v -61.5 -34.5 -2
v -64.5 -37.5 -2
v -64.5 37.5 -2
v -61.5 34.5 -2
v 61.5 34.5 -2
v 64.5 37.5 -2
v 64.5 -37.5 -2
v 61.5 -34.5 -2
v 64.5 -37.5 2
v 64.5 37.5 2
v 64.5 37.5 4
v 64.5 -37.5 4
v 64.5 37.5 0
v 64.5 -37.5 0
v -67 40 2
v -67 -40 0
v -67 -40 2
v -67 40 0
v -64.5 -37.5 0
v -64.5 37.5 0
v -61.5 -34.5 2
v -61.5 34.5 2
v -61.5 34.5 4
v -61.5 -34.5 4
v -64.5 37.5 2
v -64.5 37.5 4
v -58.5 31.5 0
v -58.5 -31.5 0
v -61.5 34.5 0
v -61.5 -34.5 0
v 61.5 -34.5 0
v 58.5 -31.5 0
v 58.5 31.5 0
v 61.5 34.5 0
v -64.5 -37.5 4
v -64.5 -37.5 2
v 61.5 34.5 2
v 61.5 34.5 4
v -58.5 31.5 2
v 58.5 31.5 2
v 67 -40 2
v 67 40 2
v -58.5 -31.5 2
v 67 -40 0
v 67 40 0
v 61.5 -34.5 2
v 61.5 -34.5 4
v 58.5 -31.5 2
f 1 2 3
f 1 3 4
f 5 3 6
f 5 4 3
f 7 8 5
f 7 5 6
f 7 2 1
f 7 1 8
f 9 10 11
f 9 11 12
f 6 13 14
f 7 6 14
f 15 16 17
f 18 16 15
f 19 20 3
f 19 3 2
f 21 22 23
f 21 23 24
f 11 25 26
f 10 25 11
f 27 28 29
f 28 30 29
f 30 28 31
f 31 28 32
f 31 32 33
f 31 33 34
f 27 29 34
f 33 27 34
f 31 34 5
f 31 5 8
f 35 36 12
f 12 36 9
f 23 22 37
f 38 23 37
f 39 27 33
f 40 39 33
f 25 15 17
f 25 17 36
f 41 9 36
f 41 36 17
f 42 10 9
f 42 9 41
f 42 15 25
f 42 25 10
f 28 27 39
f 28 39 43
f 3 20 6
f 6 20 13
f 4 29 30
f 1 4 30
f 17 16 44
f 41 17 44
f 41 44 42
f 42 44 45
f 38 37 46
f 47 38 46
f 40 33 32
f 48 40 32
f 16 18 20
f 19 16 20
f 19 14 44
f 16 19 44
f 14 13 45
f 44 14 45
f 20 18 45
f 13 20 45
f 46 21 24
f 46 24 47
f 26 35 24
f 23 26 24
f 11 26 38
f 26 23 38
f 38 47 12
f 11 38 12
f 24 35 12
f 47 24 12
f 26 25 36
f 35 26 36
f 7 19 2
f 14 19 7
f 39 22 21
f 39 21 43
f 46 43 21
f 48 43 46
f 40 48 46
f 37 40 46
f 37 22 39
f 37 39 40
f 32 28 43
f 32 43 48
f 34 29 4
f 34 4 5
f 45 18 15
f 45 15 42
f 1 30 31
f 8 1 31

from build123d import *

# Parameters (mm, degrees)
F0_W          = 134
F0_H          = 80
F1_DEPTH      = 2
F2_W          = 129
F2_H          = 75
F2_W_2        = 123
F2_H_2        = 69
F3_DEPTH      = 2
F3_DEPTH_BACK = 4
F4_W          = 117
F4_H          = 63
F5_DEPTH      = 25


with BuildPart() as f1:
    # F0 (on Top) → F1 (new body)
    with BuildSketch(Plane.XY):
        Rectangle(F0_W, F0_H)
    extrude(amount=F1_DEPTH)

    # F2 (on face) → F3 (join, two sides)
    with BuildSketch(Plane(origin=(0, 0, 0), x_dir=(1, 0, 0), z_dir=(0, 0, -1))) as f3_sk:
        Rectangle(F2_W, F2_H)
        Rectangle(F2_W_2, F2_H_2, mode=Mode.SUBTRACT)
    extrude(amount=F3_DEPTH)
    extrude(f3_sk.sketch, amount=-F3_DEPTH_BACK)

    # F4 (on face) → F5 (cut)
    with BuildSketch(Plane(origin=(0, 0, 0), x_dir=(1, 0, 0), z_dir=(0, 0, -1))):
        Rectangle(F4_W, F4_H)
    extrude(amount=-F5_DEPTH, mode=Mode.SUBTRACT)


solid = f1.part
